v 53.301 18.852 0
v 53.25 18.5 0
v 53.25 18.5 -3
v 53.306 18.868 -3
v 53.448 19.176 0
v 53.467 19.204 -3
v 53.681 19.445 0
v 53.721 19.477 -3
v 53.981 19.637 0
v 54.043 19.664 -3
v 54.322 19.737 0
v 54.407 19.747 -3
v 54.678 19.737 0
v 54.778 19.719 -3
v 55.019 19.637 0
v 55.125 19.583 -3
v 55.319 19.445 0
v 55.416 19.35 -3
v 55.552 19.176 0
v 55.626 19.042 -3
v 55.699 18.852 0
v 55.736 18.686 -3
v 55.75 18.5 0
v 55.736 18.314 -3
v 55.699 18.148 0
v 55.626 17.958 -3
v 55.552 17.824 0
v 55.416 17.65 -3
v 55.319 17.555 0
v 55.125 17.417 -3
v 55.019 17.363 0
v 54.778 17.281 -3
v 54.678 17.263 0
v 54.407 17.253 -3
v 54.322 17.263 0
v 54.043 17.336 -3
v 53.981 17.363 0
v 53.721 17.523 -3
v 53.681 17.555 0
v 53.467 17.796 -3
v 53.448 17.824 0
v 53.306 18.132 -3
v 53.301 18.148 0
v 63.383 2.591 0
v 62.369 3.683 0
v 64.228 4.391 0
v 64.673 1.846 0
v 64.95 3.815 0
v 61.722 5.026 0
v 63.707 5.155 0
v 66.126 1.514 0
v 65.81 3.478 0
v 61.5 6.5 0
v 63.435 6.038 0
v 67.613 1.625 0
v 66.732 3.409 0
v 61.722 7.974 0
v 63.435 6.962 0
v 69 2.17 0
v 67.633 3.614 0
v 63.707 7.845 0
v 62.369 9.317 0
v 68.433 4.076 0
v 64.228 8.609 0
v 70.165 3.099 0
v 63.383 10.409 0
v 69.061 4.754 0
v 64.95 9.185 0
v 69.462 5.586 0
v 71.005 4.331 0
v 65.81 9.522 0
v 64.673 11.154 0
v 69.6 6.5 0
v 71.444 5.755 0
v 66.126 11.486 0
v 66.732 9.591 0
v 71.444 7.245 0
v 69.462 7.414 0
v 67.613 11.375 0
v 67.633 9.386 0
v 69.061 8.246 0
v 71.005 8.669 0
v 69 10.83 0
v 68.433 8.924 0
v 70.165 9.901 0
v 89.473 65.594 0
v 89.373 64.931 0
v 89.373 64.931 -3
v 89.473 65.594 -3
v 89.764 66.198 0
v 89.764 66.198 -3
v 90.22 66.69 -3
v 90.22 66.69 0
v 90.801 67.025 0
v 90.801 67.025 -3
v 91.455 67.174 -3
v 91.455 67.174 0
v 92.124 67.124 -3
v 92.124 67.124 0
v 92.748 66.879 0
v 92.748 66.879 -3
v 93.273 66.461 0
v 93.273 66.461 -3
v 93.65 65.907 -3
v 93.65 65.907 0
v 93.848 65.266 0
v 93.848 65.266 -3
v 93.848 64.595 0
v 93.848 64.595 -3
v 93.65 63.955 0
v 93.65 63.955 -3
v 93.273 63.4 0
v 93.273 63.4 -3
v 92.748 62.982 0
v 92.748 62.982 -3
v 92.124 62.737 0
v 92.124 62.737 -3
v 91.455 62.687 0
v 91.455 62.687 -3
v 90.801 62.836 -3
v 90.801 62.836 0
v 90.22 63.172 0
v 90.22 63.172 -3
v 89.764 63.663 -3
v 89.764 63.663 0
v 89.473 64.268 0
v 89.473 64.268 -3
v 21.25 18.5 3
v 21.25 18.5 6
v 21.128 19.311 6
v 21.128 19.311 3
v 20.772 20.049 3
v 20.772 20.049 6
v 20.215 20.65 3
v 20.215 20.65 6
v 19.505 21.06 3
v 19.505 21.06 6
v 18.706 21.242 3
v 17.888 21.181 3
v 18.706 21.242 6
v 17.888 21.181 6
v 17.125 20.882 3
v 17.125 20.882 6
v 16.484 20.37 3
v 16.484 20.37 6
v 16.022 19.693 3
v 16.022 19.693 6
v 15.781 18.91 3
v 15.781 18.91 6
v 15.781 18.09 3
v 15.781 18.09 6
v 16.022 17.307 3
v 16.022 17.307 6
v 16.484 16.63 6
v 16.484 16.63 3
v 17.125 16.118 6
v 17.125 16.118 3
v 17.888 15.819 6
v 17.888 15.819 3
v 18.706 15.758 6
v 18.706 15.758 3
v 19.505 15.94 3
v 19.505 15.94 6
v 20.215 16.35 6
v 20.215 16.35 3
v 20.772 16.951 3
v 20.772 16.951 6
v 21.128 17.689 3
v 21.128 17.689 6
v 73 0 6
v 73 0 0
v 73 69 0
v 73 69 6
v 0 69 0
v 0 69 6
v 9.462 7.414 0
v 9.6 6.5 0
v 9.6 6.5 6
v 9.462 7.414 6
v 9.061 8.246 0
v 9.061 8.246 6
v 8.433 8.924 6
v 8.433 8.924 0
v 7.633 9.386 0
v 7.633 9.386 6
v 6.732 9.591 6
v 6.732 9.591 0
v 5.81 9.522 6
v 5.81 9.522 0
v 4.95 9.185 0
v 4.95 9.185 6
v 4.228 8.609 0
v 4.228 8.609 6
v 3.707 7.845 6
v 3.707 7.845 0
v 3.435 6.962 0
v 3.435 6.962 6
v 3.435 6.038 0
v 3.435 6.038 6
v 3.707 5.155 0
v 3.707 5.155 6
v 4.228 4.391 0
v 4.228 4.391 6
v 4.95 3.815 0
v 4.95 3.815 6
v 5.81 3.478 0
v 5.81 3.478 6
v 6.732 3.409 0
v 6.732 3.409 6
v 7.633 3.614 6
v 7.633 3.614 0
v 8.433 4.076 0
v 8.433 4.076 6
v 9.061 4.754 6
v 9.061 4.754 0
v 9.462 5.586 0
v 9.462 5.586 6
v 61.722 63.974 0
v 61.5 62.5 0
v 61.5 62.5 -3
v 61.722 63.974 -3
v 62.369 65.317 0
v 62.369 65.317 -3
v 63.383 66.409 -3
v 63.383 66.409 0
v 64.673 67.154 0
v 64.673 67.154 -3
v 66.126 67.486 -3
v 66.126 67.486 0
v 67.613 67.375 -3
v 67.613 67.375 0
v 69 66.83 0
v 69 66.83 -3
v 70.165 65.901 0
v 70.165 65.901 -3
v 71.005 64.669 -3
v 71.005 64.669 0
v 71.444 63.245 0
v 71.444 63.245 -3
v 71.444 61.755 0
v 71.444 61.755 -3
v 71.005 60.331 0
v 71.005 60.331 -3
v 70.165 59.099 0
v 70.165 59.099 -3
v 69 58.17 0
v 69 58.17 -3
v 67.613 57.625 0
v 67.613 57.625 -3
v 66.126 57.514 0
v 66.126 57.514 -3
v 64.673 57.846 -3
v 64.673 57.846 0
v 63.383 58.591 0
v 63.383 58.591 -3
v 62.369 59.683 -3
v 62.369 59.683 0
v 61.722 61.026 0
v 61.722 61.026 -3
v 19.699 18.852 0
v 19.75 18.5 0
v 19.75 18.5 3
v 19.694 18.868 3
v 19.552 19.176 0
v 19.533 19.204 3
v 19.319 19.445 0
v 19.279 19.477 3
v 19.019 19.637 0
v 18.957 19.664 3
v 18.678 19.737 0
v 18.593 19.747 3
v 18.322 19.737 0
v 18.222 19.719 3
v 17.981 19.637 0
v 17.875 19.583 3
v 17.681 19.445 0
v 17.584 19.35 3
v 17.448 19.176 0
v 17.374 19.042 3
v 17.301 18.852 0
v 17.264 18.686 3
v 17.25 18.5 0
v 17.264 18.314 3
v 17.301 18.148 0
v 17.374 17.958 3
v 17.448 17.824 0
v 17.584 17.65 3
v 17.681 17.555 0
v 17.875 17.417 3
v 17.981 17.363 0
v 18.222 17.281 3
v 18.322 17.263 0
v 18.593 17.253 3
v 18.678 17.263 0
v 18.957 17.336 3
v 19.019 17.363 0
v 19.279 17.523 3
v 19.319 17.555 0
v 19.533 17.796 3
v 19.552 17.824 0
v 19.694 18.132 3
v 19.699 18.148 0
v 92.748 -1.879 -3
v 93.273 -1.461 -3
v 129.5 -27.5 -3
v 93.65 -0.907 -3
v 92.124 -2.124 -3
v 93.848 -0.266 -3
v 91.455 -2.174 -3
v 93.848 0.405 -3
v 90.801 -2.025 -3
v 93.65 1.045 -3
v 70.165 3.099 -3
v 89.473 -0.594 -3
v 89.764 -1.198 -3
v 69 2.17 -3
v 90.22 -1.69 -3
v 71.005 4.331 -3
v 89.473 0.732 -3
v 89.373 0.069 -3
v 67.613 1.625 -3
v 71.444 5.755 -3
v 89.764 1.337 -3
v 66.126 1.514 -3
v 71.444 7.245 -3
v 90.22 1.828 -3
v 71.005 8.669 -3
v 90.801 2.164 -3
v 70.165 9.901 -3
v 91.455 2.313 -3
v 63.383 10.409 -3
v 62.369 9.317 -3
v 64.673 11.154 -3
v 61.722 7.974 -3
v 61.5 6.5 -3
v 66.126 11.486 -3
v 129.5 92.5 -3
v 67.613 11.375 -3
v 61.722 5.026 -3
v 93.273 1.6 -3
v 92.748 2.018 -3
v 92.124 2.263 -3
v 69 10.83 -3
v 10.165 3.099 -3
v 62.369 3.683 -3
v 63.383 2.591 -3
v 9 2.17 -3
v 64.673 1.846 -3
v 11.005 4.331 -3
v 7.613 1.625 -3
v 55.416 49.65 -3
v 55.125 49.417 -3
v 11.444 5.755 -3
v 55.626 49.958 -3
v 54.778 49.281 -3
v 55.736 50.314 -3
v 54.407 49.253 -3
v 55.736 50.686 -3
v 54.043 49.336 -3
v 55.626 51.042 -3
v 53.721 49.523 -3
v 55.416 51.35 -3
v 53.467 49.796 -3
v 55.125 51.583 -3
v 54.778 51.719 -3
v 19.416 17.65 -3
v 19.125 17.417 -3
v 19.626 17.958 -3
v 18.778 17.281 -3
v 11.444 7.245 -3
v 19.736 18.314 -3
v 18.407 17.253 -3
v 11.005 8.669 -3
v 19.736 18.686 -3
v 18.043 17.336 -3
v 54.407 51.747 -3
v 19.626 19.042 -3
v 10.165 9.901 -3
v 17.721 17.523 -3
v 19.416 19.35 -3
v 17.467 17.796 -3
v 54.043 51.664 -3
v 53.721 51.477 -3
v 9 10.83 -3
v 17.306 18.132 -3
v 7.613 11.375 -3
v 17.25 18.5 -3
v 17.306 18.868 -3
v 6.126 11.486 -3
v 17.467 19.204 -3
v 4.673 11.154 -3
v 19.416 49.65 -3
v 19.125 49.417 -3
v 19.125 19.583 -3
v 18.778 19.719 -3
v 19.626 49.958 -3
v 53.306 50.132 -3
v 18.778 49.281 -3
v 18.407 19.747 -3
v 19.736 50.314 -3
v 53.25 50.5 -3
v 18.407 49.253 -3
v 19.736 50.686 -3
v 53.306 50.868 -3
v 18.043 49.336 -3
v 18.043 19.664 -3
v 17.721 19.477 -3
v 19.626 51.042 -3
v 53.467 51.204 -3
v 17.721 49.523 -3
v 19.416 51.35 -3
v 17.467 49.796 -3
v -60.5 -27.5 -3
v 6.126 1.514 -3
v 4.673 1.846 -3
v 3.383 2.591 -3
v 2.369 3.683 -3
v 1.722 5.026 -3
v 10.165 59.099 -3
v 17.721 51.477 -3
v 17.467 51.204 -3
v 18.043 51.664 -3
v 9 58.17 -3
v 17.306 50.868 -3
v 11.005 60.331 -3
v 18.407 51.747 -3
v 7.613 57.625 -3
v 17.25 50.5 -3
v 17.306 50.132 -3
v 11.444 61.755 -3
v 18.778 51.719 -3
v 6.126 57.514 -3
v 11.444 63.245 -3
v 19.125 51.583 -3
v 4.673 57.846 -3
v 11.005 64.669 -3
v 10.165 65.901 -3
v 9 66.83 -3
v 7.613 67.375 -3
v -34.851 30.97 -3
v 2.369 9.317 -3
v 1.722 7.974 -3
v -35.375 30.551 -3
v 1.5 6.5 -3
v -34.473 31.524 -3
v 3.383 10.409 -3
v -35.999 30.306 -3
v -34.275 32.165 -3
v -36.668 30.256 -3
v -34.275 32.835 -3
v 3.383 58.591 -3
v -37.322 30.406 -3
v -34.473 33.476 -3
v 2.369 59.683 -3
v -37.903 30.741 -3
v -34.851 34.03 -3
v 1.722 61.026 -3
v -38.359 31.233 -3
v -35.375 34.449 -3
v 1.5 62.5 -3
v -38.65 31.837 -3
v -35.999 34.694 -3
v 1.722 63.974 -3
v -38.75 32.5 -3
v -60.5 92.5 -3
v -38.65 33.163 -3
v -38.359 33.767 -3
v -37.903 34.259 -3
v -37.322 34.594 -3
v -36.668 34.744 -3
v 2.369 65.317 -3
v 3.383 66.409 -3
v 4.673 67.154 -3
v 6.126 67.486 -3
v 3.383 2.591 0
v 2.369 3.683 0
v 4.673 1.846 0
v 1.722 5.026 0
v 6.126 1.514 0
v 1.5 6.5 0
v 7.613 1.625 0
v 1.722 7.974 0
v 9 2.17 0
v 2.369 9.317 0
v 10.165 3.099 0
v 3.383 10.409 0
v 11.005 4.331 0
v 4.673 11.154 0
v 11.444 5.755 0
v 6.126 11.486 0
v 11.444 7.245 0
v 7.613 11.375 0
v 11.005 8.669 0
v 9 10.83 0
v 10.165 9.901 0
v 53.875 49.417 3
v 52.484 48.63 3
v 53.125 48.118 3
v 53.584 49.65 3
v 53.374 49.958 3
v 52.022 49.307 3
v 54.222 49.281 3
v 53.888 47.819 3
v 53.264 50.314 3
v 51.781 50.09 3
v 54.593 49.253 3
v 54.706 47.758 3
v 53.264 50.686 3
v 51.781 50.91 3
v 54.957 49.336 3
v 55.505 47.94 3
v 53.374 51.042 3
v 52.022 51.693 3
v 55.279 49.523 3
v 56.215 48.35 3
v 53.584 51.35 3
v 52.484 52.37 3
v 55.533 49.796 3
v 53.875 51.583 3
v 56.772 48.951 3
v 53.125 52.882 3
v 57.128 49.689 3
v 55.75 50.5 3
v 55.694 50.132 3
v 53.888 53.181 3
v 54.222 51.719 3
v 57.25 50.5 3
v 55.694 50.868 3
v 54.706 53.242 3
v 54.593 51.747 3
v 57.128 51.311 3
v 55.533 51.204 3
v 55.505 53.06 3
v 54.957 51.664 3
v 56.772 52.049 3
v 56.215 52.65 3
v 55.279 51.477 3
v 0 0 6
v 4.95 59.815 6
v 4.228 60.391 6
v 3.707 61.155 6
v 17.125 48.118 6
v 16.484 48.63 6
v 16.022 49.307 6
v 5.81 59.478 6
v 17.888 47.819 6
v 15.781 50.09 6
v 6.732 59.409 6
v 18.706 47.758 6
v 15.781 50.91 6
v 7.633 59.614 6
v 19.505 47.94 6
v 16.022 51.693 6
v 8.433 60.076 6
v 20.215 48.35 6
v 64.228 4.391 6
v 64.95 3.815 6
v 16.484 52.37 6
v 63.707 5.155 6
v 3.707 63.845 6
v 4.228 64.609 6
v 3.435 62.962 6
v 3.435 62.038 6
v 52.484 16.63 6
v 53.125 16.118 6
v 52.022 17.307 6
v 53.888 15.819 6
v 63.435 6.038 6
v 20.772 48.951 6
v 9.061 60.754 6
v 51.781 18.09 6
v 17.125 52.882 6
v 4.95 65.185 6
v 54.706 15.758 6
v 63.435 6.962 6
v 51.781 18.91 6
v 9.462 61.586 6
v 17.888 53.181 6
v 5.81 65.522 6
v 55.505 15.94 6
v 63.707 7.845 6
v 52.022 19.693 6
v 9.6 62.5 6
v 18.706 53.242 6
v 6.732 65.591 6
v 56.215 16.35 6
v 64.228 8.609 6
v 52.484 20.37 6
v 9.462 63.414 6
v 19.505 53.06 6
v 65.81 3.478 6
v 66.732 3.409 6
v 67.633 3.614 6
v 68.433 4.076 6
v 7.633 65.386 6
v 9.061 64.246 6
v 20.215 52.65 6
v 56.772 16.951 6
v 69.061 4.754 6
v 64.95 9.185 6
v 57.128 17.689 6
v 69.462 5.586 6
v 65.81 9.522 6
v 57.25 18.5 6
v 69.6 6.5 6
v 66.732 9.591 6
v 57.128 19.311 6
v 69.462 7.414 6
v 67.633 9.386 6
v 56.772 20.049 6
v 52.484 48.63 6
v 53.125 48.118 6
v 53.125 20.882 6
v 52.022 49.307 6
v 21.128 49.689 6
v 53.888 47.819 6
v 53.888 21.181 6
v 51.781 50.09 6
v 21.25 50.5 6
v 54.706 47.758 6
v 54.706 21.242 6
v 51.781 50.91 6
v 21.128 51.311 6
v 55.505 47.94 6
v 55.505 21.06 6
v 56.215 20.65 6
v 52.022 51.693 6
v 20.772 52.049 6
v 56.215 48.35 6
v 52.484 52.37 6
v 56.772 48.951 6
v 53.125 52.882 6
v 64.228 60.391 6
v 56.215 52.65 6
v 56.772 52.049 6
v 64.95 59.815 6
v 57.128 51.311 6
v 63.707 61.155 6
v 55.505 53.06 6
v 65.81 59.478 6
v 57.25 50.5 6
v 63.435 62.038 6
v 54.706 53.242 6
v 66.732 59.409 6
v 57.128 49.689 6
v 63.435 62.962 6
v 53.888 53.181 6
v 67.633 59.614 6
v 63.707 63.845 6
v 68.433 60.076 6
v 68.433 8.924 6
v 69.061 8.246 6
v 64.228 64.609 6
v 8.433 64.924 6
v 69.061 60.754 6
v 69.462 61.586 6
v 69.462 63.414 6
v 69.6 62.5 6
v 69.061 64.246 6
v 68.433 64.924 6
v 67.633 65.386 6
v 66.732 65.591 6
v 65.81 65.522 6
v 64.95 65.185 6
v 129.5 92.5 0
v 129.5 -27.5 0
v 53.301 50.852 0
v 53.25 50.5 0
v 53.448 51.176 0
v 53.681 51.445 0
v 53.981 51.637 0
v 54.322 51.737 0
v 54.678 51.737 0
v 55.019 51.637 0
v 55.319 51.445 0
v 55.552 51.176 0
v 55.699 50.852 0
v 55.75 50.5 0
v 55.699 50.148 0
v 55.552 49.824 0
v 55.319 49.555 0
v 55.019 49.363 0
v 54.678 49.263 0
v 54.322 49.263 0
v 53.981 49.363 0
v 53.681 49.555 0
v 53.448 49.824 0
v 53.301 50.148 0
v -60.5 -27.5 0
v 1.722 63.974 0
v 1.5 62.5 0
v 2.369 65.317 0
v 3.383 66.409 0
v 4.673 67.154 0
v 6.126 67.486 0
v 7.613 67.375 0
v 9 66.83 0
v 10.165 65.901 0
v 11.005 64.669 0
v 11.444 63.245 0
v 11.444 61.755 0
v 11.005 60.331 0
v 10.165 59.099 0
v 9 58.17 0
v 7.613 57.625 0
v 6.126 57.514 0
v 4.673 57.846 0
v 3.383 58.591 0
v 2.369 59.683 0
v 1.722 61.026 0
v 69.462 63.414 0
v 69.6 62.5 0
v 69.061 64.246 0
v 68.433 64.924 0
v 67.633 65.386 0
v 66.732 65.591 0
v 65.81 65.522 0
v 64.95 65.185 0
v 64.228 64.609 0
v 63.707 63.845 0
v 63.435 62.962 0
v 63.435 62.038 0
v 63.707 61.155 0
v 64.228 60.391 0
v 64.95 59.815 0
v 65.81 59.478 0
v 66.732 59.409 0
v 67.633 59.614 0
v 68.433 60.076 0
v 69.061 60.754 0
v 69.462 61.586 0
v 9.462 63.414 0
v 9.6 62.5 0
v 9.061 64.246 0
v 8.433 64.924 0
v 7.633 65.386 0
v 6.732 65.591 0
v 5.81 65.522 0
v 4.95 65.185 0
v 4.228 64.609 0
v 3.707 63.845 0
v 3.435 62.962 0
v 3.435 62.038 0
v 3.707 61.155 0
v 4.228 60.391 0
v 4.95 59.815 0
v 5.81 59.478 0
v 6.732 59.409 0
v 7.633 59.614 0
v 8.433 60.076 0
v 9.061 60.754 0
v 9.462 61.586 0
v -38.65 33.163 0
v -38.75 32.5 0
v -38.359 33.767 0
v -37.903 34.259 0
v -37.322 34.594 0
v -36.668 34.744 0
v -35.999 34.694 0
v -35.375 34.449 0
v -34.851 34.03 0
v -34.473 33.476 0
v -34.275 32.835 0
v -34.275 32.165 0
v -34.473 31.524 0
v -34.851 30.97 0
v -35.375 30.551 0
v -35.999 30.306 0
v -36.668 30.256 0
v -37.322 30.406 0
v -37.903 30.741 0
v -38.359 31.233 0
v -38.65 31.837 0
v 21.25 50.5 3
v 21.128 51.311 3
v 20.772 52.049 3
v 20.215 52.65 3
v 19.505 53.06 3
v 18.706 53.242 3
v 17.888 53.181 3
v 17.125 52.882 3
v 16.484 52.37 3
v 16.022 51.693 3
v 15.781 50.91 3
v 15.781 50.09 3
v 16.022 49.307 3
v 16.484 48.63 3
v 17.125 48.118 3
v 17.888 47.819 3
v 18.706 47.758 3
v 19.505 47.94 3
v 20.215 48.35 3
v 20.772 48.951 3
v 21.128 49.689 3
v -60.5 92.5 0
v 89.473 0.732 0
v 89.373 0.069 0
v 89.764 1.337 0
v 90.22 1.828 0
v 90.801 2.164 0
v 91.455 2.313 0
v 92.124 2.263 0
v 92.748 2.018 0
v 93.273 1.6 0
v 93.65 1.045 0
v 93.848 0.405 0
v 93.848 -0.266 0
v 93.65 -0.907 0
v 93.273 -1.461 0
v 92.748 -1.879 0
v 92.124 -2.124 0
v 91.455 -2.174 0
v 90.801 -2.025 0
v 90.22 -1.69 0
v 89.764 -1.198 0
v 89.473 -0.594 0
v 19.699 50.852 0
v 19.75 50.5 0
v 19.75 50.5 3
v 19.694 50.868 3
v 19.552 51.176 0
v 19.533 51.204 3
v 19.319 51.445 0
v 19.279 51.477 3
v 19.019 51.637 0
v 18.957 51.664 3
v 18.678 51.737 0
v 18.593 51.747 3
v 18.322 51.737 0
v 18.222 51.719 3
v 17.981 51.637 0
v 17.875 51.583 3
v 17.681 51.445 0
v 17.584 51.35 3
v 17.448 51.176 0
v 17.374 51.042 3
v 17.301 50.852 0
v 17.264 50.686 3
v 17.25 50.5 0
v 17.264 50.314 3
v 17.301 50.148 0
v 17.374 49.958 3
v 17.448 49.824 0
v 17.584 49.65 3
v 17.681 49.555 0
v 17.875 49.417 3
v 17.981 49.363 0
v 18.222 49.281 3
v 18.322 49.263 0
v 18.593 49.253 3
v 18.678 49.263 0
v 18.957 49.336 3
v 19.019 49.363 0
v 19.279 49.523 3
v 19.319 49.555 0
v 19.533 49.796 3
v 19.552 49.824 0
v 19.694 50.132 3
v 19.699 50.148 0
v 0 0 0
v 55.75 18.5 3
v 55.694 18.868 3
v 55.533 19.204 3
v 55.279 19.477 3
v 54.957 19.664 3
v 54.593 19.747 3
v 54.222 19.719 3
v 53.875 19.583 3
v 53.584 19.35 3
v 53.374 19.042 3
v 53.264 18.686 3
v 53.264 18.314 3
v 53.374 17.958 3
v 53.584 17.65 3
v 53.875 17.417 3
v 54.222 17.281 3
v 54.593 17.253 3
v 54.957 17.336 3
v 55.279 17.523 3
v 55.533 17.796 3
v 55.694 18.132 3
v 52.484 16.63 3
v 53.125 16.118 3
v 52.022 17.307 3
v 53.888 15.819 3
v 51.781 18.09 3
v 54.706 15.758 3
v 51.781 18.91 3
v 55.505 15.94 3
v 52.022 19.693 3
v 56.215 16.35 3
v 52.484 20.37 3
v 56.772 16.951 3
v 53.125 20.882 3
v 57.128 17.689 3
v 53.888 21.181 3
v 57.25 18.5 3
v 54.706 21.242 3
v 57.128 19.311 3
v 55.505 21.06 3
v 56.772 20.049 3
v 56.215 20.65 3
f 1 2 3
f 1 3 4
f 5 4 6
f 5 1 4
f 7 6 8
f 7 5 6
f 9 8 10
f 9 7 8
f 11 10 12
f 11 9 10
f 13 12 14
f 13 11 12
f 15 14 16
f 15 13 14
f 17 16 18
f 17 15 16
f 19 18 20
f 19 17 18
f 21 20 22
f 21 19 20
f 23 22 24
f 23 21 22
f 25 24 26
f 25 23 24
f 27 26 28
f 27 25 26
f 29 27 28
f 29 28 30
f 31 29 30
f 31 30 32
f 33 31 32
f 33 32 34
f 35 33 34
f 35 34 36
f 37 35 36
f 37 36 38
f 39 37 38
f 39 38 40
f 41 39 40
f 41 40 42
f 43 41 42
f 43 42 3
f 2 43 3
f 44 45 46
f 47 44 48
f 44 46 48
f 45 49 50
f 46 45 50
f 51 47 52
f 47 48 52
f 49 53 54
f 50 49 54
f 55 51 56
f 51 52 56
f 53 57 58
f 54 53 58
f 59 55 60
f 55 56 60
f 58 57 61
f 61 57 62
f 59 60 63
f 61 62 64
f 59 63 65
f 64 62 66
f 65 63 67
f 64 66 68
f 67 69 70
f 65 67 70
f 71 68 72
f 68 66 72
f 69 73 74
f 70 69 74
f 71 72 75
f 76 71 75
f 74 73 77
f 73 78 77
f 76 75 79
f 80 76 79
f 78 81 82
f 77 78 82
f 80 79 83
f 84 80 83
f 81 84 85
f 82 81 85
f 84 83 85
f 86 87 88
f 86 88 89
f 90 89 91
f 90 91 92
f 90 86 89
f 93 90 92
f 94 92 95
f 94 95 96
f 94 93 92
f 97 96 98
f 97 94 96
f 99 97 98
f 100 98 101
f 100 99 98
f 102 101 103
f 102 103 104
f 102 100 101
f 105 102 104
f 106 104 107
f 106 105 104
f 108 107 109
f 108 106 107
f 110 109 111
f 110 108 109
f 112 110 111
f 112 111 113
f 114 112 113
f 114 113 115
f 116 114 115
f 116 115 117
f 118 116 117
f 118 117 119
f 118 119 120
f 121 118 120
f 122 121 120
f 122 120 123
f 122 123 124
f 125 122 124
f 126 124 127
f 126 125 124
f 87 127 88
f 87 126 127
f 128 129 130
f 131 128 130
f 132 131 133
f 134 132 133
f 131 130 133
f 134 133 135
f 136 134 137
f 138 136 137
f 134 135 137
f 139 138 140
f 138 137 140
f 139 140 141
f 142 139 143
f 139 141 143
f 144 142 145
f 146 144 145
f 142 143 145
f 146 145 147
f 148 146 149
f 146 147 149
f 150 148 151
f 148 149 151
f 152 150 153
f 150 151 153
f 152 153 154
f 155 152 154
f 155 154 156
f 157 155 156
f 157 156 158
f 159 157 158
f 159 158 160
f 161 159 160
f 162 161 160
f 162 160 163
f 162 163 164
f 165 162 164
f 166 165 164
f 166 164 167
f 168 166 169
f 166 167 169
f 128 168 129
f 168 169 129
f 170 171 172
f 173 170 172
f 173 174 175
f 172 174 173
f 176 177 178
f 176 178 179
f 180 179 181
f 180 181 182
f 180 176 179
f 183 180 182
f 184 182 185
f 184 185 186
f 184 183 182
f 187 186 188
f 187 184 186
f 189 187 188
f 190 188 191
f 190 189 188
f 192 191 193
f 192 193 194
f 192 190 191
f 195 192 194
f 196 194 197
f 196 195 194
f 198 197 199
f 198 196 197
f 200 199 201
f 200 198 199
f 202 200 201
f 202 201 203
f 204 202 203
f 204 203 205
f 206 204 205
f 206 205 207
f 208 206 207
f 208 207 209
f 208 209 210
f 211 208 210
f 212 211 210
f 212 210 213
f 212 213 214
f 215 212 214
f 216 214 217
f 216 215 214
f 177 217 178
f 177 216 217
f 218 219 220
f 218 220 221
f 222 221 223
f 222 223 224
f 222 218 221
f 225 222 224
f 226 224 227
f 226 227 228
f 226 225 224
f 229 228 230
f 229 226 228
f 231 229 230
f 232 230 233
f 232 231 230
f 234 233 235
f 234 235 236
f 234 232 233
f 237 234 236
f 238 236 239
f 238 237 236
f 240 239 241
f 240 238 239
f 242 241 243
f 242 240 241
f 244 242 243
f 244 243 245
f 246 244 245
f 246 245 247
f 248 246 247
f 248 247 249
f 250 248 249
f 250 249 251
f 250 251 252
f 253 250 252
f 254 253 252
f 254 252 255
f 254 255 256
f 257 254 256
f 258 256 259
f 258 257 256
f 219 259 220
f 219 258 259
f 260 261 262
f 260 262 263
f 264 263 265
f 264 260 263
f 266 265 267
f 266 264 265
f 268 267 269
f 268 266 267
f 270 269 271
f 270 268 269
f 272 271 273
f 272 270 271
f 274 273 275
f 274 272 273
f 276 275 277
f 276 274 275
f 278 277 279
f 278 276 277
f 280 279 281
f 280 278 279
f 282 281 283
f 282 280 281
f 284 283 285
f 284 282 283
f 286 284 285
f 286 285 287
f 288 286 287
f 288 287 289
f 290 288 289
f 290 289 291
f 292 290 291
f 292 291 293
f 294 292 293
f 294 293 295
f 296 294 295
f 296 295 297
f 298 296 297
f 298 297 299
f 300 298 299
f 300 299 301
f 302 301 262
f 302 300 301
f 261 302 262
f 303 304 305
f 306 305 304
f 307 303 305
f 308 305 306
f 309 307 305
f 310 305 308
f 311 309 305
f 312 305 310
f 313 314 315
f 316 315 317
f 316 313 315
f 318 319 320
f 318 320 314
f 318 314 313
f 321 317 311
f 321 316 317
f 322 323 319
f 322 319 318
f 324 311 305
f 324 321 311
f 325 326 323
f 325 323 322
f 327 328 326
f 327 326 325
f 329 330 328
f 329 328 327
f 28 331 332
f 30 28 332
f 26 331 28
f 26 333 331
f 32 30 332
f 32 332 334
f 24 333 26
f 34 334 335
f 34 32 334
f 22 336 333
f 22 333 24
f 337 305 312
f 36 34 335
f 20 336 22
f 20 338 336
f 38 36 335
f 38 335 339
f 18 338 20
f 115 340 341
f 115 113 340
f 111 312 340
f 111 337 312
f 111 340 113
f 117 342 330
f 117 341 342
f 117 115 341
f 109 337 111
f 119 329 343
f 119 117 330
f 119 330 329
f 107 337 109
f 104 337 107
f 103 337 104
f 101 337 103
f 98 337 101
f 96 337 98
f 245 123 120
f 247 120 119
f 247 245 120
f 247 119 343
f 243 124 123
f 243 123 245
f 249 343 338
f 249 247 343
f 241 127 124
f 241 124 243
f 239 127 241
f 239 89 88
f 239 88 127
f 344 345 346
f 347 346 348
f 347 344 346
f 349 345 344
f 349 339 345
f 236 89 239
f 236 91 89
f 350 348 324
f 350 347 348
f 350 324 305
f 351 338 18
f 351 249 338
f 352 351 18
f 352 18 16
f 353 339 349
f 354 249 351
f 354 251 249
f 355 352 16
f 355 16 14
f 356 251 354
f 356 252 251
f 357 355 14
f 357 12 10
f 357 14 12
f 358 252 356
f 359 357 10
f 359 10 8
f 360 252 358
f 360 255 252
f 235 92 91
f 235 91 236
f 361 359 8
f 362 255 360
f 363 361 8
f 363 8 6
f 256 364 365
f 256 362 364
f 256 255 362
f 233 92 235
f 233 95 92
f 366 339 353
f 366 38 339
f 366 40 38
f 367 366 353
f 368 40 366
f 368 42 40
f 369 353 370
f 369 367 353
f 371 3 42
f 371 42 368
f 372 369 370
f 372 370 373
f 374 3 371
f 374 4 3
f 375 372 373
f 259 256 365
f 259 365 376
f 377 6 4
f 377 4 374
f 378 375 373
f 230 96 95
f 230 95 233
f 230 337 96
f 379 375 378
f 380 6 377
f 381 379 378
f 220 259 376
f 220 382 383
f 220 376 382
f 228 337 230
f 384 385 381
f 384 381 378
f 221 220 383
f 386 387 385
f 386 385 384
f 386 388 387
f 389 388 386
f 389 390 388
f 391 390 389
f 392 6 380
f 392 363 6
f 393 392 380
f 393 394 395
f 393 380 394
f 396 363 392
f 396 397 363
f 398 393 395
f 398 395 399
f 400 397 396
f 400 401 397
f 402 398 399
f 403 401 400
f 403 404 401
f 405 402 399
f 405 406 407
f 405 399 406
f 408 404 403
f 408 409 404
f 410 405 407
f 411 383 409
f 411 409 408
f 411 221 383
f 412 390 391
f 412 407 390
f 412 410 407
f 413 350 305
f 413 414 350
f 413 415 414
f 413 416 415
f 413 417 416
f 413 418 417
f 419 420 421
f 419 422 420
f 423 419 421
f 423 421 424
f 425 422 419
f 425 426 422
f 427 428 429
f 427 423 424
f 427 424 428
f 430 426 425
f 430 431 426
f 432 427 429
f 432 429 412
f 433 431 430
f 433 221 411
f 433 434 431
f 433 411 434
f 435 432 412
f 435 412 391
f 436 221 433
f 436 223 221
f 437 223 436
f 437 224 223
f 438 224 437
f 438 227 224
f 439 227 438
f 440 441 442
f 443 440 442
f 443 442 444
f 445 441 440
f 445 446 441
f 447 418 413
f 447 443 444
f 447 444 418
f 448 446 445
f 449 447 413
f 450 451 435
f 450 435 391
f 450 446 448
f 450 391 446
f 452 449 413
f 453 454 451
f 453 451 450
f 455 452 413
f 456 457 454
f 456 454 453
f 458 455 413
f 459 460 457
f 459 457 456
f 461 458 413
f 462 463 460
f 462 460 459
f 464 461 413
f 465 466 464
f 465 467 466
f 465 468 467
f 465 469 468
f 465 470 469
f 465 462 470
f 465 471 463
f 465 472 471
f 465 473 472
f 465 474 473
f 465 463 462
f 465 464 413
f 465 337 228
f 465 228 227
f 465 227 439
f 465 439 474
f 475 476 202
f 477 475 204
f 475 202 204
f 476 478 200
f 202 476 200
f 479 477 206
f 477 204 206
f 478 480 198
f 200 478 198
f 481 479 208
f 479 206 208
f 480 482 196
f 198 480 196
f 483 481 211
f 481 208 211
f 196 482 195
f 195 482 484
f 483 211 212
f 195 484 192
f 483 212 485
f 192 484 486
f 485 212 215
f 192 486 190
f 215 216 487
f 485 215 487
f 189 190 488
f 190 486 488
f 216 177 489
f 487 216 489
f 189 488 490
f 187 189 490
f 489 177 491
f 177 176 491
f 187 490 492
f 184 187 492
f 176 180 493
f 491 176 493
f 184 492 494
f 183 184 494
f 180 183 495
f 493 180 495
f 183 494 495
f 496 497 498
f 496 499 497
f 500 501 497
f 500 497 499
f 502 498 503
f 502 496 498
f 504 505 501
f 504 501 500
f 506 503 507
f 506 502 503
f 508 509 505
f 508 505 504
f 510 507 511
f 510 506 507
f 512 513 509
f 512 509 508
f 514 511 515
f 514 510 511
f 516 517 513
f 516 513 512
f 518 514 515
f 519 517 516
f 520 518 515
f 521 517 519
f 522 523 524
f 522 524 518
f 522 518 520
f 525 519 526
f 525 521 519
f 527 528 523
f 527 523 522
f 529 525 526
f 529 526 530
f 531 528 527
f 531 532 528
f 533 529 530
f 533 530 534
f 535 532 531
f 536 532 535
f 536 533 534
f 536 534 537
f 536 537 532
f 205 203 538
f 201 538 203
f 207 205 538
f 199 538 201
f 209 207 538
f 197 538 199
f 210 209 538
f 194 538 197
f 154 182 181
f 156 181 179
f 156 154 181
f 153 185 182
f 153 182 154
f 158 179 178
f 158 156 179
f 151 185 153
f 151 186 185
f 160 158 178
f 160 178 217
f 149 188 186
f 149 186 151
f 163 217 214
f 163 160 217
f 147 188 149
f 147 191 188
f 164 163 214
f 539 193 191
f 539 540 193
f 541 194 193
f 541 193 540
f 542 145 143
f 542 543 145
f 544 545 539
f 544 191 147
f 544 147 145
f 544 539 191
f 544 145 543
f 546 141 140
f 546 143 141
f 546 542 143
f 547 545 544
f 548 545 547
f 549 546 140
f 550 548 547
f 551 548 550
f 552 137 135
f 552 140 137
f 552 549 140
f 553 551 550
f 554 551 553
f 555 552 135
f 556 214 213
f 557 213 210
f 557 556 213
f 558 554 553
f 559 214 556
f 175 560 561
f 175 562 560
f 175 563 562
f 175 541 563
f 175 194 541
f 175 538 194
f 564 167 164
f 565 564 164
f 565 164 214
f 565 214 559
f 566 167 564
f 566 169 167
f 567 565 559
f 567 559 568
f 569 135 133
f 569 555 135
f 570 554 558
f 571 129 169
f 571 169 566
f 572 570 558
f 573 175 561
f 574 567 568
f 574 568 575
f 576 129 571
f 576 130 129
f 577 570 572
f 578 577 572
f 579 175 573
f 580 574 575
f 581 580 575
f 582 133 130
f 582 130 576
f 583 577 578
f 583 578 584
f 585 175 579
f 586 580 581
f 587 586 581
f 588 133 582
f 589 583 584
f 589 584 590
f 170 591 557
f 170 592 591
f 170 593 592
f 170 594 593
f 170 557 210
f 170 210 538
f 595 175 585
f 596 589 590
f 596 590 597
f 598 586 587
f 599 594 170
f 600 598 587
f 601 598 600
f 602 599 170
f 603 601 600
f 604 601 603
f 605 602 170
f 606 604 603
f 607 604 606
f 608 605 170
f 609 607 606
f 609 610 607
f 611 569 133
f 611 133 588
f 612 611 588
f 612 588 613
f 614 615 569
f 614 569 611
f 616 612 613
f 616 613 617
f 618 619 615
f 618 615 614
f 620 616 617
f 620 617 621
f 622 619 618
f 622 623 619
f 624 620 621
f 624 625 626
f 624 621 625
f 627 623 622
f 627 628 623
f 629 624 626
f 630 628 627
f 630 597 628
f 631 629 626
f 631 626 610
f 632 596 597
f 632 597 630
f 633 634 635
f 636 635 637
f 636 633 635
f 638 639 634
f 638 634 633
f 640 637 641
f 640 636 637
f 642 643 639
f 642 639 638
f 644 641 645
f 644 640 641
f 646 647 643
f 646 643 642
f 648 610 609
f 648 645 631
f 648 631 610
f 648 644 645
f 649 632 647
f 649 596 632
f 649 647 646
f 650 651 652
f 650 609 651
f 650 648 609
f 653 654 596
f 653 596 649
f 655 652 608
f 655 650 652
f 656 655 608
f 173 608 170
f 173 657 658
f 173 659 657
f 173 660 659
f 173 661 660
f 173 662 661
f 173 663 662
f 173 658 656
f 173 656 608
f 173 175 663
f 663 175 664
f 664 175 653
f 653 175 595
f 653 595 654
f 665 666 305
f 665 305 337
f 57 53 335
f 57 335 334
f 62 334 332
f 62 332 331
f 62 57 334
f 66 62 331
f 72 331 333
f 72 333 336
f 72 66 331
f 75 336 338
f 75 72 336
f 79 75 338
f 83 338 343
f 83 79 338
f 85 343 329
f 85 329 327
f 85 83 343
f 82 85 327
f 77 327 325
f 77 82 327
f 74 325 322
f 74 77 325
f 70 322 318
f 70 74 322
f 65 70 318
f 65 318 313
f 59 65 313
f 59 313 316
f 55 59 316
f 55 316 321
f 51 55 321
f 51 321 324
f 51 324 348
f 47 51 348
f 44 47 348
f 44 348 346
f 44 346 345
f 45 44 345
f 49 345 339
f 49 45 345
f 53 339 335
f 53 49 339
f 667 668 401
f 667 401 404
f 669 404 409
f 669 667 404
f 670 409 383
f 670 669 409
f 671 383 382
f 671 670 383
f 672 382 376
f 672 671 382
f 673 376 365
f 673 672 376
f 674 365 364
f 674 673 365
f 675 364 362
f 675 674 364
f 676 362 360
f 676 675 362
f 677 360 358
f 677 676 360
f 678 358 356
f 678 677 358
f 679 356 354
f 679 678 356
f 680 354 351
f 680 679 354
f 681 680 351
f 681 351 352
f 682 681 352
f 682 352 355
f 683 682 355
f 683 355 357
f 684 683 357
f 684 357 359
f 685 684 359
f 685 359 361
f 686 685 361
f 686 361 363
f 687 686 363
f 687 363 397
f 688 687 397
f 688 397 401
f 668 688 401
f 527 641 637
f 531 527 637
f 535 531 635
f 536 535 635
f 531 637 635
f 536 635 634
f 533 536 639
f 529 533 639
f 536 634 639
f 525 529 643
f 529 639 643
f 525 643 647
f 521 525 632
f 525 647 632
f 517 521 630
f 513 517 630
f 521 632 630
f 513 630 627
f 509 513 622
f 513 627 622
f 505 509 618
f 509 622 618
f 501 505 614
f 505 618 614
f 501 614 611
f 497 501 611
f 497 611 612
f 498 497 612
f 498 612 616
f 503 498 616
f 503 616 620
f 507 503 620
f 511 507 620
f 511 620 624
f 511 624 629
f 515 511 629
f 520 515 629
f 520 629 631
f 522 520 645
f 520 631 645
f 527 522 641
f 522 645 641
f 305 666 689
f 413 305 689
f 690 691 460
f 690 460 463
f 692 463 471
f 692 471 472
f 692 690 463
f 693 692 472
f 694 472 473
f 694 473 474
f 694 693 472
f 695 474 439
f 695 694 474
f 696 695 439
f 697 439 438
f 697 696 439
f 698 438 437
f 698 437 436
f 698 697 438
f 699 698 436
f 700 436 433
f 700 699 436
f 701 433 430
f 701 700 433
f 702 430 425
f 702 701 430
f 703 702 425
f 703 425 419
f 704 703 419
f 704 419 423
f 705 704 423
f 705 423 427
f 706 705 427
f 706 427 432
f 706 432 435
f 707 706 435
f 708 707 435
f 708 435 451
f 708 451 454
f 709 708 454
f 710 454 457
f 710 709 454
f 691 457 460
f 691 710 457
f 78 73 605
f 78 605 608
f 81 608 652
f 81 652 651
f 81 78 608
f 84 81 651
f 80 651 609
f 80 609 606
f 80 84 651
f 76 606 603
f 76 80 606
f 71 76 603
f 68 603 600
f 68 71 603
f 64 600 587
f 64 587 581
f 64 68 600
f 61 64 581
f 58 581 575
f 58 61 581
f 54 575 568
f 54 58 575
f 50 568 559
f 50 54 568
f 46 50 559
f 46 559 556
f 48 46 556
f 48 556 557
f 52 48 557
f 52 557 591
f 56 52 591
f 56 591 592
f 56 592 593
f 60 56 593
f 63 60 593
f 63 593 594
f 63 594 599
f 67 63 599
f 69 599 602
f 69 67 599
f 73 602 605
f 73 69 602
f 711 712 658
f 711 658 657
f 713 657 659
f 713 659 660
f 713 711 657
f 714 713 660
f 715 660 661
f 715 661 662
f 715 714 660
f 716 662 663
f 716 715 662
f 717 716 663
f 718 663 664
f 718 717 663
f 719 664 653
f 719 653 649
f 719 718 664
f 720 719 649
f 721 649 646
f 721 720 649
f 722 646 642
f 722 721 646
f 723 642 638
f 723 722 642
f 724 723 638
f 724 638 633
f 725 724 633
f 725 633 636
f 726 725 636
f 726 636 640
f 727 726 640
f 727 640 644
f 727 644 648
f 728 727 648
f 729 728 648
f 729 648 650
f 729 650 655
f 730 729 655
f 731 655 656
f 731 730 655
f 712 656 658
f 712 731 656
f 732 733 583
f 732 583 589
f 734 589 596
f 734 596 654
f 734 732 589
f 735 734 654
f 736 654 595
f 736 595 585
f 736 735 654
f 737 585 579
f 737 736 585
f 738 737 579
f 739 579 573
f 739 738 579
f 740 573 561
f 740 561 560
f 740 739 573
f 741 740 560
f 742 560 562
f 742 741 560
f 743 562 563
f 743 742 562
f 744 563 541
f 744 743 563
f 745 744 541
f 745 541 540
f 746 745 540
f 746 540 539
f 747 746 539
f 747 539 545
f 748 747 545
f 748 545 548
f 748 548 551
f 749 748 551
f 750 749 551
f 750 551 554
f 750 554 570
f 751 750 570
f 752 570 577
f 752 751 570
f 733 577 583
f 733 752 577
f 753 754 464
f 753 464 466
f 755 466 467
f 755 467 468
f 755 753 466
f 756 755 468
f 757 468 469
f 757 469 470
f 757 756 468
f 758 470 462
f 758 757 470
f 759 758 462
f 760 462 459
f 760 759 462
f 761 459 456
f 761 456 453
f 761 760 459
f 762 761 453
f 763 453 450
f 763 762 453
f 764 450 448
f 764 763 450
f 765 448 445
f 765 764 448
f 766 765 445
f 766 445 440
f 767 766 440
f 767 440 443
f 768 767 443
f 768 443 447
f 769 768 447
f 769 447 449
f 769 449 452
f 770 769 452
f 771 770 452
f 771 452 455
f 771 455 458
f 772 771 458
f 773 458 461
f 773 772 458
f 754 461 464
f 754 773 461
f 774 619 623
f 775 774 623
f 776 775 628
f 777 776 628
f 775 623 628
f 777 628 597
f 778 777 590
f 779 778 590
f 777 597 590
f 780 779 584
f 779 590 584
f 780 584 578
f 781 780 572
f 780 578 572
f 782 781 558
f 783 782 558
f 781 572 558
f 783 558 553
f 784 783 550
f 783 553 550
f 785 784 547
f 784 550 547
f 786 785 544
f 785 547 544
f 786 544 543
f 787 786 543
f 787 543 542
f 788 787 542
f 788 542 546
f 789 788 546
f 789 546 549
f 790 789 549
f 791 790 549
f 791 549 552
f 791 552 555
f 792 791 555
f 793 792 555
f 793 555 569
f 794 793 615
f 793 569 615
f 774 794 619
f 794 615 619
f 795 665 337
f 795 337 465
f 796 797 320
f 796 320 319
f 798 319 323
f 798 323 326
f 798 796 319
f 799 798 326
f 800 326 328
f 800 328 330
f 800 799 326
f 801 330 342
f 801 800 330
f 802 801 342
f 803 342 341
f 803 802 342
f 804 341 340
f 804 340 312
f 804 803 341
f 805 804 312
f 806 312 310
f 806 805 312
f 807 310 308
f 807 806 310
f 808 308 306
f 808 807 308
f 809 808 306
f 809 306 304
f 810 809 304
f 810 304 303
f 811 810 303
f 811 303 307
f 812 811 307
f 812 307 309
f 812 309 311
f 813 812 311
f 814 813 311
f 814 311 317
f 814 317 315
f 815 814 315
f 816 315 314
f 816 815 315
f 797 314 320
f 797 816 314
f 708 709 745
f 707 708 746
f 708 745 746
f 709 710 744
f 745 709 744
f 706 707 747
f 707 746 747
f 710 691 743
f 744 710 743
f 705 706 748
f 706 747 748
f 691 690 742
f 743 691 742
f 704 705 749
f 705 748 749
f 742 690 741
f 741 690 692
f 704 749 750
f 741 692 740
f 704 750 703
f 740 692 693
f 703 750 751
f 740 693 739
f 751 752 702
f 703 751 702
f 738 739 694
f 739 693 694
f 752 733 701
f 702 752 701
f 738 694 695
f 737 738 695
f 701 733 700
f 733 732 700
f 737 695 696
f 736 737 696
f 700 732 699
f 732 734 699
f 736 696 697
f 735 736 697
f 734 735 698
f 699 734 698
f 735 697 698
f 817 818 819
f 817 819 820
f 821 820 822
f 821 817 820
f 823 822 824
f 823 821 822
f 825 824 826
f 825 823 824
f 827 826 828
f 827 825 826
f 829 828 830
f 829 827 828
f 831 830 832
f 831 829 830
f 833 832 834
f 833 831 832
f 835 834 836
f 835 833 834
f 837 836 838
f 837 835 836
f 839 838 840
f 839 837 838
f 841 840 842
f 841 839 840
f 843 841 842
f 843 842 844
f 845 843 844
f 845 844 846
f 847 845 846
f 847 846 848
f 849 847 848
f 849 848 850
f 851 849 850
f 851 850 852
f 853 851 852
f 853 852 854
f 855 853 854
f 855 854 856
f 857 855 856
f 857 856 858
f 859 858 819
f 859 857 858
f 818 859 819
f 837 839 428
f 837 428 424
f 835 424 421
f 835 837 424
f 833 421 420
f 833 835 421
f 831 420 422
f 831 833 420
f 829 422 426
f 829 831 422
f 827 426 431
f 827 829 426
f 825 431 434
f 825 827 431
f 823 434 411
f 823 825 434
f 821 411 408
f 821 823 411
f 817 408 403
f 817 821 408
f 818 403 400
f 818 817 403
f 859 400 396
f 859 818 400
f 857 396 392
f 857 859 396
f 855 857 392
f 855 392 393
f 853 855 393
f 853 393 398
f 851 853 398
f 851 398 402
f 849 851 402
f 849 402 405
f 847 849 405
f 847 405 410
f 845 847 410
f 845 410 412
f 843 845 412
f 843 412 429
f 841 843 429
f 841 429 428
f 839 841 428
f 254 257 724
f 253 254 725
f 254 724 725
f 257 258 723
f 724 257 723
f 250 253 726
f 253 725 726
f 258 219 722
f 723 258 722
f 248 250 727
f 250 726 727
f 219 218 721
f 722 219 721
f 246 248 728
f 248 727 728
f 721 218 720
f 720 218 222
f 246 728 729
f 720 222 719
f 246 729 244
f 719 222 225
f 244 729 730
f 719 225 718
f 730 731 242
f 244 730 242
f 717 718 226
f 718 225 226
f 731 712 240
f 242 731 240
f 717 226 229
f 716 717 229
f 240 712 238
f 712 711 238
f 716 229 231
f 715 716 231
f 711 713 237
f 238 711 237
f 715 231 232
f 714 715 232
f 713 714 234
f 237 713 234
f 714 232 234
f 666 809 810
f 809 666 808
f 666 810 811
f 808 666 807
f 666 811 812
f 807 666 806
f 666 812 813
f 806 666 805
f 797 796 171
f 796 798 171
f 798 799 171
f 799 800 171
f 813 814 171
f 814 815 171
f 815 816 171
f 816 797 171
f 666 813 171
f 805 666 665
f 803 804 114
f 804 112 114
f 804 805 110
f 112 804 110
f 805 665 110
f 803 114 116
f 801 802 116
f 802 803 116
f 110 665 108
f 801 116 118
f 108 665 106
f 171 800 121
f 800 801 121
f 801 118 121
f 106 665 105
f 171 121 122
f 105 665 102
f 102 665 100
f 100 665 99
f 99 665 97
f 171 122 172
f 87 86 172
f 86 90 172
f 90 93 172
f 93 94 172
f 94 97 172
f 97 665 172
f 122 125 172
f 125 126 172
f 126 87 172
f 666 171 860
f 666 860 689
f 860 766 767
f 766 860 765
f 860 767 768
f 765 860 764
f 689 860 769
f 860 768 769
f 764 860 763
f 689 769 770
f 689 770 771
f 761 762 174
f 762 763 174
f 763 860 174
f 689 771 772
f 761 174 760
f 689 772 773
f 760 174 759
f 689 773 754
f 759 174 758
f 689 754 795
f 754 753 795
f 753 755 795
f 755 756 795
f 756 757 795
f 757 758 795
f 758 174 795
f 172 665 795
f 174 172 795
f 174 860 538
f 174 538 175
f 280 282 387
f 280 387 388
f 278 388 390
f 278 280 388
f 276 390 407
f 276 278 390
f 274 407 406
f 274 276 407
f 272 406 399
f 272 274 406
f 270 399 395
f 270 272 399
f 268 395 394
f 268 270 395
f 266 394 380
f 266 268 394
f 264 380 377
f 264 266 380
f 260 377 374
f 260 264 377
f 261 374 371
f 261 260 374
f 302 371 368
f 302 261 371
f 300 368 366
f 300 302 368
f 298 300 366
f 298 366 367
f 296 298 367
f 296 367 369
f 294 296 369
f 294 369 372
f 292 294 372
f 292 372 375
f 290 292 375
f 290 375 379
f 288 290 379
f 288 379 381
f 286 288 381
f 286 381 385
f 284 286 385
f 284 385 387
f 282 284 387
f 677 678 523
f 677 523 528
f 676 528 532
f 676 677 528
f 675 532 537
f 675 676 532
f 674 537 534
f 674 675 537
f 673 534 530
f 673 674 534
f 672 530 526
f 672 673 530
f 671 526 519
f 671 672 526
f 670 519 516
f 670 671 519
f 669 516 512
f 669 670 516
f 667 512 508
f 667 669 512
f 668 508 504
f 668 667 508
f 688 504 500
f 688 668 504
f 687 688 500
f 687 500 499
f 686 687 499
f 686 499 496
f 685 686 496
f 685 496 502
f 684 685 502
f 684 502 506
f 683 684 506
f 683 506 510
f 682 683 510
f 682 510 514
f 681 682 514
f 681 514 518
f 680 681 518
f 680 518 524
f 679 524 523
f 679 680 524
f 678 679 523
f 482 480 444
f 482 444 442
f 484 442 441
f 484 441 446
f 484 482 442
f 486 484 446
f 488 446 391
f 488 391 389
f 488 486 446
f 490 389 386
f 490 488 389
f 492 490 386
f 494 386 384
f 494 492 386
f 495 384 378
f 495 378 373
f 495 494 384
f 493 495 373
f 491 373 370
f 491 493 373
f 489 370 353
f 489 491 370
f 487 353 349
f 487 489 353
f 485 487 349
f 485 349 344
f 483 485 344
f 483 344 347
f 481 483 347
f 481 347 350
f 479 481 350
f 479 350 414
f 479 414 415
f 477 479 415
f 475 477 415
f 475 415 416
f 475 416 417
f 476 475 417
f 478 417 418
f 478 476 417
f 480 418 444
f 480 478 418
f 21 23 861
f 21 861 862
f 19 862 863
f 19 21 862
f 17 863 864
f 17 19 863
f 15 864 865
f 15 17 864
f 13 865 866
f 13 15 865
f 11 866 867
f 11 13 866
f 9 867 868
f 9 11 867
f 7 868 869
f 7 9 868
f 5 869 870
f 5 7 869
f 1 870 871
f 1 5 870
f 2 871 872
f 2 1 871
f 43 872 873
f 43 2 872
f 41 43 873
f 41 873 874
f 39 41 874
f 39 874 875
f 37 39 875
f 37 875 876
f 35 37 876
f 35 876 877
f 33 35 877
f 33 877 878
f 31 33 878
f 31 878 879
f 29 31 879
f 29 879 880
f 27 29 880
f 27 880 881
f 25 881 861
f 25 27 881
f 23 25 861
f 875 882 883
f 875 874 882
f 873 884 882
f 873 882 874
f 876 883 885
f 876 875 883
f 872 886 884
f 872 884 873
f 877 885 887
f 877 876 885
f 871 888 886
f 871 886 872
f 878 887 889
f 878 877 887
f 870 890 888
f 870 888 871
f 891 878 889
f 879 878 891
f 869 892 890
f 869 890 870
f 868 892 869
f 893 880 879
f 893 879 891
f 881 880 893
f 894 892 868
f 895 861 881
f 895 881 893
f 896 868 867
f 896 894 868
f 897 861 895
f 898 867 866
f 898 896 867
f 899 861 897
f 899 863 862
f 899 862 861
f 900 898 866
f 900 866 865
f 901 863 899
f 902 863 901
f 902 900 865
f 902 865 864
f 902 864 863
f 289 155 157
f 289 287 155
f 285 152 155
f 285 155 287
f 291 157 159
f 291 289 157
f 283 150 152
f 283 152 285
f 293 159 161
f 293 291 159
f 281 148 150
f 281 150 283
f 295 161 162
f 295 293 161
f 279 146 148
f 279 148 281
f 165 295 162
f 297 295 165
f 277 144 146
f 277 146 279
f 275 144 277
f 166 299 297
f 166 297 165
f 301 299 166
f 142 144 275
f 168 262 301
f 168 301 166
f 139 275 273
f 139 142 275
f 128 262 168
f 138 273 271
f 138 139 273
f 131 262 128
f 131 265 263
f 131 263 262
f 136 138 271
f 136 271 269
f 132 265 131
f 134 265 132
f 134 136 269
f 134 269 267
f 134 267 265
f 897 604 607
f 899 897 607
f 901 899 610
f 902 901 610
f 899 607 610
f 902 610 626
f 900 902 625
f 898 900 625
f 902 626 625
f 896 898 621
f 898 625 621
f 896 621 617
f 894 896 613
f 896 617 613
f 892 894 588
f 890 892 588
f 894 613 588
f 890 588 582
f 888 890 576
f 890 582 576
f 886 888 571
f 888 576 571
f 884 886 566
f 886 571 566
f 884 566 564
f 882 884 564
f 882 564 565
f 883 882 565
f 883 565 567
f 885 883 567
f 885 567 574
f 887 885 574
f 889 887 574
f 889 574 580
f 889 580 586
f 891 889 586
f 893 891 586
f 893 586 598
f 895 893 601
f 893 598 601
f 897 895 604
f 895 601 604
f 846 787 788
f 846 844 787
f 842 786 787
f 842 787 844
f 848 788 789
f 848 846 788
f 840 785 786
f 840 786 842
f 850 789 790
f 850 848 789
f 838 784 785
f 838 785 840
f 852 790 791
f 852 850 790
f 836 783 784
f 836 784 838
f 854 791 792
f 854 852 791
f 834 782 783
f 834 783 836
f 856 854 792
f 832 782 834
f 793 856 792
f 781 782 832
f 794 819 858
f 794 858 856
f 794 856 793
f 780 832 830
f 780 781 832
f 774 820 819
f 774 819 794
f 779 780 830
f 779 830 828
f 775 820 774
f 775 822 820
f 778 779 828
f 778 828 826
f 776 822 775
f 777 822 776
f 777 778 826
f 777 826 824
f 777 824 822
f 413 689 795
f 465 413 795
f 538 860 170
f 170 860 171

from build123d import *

# Parameters (mm, degrees)
CROQUIS1_W              = 73
CROQUIS1_H              = 69
CROQUIS1_R              = 3.1
CROQUIS1_R_2            = 1.25
SALIENTE_EXTRUIR1_DEPTH = 6
CROQUIS3_W              = 190
CROQUIS3_H              = 120
CROQUIS3_R              = 2.25
CROQUIS3_R_2            = 5
CROQUIS3_R_3            = 1.25
SALIENTE_EXTRUIR2_DEPTH = 3
CROQUIS5_R              = 2.75
CORTAR_EXTRUIR1_DEPTH   = 3


with BuildPart() as part:
    # Croquis1 → Saliente-Extruir1 (new body)
    with BuildSketch(Plane.XY):
        with Locations((36.5, 34.5)):
            Rectangle(CROQUIS1_W, CROQUIS1_H)
        with Locations((6.5, 6.5)):
            Circle(CROQUIS1_R, mode=Mode.SUBTRACT)
        with Locations((66.5, 6.5)):
            Circle(CROQUIS1_R, mode=Mode.SUBTRACT)
        with Locations((66.5, 62.5)):
            Circle(CROQUIS1_R, mode=Mode.SUBTRACT)
        with Locations((6.5, 62.5)):
            Circle(CROQUIS1_R, mode=Mode.SUBTRACT)
        with Locations((18.5, 50.5)):
            Circle(CROQUIS1_R_2, mode=Mode.SUBTRACT)
        with Locations((54.5, 50.5)):
            Circle(CROQUIS1_R_2, mode=Mode.SUBTRACT)
        with Locations((54.5, 18.5)):
            Circle(CROQUIS1_R_2, mode=Mode.SUBTRACT)
        with Locations((18.5, 18.5)):
            Circle(CROQUIS1_R_2, mode=Mode.SUBTRACT)
    extrude(amount=SALIENTE_EXTRUIR1_DEPTH)

    # Croquis3 → Saliente-Extruir2 (add)
    with BuildSketch(Plane(origin=(0, 0, 0), x_dir=(-1, 0, 0), z_dir=(0, 0, -1))):
        with Locations((-34.5, 32.5)):
            Rectangle(CROQUIS3_W, CROQUIS3_H)
        with Locations((36.5, 32.5)):
            Circle(CROQUIS3_R, mode=Mode.SUBTRACT)
        with Locations((-91.623199077, 0.069259856)):
            Circle(CROQUIS3_R, mode=Mode.SUBTRACT)
        with Locations((-91.623199077, 64.930740144)):
            Circle(CROQUIS3_R, mode=Mode.SUBTRACT)
        with Locations((-66.5, 62.5)):
            Circle(CROQUIS3_R_2, mode=Mode.SUBTRACT)
        with Locations((-6.5, 62.5)):
            Circle(CROQUIS3_R_2, mode=Mode.SUBTRACT)
        with Locations((-6.5, 6.5)):
            Circle(CROQUIS3_R_2, mode=Mode.SUBTRACT)
        with Locations((-66.5, 6.5)):
            Circle(CROQUIS3_R_2, mode=Mode.SUBTRACT)
        with Locations((-54.5, 50.5)):
            Circle(CROQUIS3_R_3, mode=Mode.SUBTRACT)
        with Locations((-18.5, 50.5)):
            Circle(CROQUIS3_R_3, mode=Mode.SUBTRACT)
        with Locations((-18.5, 18.5)):
            Circle(CROQUIS3_R_3, mode=Mode.SUBTRACT)
        with Locations((-54.5, 18.5)):
            Circle(CROQUIS3_R_3, mode=Mode.SUBTRACT)
    extrude(amount=SALIENTE_EXTRUIR2_DEPTH)

    # Croquis5 → Cortar-Extruir1 (cut)
    with BuildSketch(Plane.XY.offset(6)):
        with Locations((18.5, 50.5)):
            Circle(CROQUIS5_R)
        with Locations((54.5, 50.5)):
            Circle(CROQUIS5_R)
        with Locations((54.5, 18.5)):
            Circle(CROQUIS5_R)
        with Locations((18.5, 18.5)):
            Circle(CROQUIS5_R)
    extrude(amount=-CORTAR_EXTRUIR1_DEPTH, mode=Mode.SUBTRACT)


solid = part.part
